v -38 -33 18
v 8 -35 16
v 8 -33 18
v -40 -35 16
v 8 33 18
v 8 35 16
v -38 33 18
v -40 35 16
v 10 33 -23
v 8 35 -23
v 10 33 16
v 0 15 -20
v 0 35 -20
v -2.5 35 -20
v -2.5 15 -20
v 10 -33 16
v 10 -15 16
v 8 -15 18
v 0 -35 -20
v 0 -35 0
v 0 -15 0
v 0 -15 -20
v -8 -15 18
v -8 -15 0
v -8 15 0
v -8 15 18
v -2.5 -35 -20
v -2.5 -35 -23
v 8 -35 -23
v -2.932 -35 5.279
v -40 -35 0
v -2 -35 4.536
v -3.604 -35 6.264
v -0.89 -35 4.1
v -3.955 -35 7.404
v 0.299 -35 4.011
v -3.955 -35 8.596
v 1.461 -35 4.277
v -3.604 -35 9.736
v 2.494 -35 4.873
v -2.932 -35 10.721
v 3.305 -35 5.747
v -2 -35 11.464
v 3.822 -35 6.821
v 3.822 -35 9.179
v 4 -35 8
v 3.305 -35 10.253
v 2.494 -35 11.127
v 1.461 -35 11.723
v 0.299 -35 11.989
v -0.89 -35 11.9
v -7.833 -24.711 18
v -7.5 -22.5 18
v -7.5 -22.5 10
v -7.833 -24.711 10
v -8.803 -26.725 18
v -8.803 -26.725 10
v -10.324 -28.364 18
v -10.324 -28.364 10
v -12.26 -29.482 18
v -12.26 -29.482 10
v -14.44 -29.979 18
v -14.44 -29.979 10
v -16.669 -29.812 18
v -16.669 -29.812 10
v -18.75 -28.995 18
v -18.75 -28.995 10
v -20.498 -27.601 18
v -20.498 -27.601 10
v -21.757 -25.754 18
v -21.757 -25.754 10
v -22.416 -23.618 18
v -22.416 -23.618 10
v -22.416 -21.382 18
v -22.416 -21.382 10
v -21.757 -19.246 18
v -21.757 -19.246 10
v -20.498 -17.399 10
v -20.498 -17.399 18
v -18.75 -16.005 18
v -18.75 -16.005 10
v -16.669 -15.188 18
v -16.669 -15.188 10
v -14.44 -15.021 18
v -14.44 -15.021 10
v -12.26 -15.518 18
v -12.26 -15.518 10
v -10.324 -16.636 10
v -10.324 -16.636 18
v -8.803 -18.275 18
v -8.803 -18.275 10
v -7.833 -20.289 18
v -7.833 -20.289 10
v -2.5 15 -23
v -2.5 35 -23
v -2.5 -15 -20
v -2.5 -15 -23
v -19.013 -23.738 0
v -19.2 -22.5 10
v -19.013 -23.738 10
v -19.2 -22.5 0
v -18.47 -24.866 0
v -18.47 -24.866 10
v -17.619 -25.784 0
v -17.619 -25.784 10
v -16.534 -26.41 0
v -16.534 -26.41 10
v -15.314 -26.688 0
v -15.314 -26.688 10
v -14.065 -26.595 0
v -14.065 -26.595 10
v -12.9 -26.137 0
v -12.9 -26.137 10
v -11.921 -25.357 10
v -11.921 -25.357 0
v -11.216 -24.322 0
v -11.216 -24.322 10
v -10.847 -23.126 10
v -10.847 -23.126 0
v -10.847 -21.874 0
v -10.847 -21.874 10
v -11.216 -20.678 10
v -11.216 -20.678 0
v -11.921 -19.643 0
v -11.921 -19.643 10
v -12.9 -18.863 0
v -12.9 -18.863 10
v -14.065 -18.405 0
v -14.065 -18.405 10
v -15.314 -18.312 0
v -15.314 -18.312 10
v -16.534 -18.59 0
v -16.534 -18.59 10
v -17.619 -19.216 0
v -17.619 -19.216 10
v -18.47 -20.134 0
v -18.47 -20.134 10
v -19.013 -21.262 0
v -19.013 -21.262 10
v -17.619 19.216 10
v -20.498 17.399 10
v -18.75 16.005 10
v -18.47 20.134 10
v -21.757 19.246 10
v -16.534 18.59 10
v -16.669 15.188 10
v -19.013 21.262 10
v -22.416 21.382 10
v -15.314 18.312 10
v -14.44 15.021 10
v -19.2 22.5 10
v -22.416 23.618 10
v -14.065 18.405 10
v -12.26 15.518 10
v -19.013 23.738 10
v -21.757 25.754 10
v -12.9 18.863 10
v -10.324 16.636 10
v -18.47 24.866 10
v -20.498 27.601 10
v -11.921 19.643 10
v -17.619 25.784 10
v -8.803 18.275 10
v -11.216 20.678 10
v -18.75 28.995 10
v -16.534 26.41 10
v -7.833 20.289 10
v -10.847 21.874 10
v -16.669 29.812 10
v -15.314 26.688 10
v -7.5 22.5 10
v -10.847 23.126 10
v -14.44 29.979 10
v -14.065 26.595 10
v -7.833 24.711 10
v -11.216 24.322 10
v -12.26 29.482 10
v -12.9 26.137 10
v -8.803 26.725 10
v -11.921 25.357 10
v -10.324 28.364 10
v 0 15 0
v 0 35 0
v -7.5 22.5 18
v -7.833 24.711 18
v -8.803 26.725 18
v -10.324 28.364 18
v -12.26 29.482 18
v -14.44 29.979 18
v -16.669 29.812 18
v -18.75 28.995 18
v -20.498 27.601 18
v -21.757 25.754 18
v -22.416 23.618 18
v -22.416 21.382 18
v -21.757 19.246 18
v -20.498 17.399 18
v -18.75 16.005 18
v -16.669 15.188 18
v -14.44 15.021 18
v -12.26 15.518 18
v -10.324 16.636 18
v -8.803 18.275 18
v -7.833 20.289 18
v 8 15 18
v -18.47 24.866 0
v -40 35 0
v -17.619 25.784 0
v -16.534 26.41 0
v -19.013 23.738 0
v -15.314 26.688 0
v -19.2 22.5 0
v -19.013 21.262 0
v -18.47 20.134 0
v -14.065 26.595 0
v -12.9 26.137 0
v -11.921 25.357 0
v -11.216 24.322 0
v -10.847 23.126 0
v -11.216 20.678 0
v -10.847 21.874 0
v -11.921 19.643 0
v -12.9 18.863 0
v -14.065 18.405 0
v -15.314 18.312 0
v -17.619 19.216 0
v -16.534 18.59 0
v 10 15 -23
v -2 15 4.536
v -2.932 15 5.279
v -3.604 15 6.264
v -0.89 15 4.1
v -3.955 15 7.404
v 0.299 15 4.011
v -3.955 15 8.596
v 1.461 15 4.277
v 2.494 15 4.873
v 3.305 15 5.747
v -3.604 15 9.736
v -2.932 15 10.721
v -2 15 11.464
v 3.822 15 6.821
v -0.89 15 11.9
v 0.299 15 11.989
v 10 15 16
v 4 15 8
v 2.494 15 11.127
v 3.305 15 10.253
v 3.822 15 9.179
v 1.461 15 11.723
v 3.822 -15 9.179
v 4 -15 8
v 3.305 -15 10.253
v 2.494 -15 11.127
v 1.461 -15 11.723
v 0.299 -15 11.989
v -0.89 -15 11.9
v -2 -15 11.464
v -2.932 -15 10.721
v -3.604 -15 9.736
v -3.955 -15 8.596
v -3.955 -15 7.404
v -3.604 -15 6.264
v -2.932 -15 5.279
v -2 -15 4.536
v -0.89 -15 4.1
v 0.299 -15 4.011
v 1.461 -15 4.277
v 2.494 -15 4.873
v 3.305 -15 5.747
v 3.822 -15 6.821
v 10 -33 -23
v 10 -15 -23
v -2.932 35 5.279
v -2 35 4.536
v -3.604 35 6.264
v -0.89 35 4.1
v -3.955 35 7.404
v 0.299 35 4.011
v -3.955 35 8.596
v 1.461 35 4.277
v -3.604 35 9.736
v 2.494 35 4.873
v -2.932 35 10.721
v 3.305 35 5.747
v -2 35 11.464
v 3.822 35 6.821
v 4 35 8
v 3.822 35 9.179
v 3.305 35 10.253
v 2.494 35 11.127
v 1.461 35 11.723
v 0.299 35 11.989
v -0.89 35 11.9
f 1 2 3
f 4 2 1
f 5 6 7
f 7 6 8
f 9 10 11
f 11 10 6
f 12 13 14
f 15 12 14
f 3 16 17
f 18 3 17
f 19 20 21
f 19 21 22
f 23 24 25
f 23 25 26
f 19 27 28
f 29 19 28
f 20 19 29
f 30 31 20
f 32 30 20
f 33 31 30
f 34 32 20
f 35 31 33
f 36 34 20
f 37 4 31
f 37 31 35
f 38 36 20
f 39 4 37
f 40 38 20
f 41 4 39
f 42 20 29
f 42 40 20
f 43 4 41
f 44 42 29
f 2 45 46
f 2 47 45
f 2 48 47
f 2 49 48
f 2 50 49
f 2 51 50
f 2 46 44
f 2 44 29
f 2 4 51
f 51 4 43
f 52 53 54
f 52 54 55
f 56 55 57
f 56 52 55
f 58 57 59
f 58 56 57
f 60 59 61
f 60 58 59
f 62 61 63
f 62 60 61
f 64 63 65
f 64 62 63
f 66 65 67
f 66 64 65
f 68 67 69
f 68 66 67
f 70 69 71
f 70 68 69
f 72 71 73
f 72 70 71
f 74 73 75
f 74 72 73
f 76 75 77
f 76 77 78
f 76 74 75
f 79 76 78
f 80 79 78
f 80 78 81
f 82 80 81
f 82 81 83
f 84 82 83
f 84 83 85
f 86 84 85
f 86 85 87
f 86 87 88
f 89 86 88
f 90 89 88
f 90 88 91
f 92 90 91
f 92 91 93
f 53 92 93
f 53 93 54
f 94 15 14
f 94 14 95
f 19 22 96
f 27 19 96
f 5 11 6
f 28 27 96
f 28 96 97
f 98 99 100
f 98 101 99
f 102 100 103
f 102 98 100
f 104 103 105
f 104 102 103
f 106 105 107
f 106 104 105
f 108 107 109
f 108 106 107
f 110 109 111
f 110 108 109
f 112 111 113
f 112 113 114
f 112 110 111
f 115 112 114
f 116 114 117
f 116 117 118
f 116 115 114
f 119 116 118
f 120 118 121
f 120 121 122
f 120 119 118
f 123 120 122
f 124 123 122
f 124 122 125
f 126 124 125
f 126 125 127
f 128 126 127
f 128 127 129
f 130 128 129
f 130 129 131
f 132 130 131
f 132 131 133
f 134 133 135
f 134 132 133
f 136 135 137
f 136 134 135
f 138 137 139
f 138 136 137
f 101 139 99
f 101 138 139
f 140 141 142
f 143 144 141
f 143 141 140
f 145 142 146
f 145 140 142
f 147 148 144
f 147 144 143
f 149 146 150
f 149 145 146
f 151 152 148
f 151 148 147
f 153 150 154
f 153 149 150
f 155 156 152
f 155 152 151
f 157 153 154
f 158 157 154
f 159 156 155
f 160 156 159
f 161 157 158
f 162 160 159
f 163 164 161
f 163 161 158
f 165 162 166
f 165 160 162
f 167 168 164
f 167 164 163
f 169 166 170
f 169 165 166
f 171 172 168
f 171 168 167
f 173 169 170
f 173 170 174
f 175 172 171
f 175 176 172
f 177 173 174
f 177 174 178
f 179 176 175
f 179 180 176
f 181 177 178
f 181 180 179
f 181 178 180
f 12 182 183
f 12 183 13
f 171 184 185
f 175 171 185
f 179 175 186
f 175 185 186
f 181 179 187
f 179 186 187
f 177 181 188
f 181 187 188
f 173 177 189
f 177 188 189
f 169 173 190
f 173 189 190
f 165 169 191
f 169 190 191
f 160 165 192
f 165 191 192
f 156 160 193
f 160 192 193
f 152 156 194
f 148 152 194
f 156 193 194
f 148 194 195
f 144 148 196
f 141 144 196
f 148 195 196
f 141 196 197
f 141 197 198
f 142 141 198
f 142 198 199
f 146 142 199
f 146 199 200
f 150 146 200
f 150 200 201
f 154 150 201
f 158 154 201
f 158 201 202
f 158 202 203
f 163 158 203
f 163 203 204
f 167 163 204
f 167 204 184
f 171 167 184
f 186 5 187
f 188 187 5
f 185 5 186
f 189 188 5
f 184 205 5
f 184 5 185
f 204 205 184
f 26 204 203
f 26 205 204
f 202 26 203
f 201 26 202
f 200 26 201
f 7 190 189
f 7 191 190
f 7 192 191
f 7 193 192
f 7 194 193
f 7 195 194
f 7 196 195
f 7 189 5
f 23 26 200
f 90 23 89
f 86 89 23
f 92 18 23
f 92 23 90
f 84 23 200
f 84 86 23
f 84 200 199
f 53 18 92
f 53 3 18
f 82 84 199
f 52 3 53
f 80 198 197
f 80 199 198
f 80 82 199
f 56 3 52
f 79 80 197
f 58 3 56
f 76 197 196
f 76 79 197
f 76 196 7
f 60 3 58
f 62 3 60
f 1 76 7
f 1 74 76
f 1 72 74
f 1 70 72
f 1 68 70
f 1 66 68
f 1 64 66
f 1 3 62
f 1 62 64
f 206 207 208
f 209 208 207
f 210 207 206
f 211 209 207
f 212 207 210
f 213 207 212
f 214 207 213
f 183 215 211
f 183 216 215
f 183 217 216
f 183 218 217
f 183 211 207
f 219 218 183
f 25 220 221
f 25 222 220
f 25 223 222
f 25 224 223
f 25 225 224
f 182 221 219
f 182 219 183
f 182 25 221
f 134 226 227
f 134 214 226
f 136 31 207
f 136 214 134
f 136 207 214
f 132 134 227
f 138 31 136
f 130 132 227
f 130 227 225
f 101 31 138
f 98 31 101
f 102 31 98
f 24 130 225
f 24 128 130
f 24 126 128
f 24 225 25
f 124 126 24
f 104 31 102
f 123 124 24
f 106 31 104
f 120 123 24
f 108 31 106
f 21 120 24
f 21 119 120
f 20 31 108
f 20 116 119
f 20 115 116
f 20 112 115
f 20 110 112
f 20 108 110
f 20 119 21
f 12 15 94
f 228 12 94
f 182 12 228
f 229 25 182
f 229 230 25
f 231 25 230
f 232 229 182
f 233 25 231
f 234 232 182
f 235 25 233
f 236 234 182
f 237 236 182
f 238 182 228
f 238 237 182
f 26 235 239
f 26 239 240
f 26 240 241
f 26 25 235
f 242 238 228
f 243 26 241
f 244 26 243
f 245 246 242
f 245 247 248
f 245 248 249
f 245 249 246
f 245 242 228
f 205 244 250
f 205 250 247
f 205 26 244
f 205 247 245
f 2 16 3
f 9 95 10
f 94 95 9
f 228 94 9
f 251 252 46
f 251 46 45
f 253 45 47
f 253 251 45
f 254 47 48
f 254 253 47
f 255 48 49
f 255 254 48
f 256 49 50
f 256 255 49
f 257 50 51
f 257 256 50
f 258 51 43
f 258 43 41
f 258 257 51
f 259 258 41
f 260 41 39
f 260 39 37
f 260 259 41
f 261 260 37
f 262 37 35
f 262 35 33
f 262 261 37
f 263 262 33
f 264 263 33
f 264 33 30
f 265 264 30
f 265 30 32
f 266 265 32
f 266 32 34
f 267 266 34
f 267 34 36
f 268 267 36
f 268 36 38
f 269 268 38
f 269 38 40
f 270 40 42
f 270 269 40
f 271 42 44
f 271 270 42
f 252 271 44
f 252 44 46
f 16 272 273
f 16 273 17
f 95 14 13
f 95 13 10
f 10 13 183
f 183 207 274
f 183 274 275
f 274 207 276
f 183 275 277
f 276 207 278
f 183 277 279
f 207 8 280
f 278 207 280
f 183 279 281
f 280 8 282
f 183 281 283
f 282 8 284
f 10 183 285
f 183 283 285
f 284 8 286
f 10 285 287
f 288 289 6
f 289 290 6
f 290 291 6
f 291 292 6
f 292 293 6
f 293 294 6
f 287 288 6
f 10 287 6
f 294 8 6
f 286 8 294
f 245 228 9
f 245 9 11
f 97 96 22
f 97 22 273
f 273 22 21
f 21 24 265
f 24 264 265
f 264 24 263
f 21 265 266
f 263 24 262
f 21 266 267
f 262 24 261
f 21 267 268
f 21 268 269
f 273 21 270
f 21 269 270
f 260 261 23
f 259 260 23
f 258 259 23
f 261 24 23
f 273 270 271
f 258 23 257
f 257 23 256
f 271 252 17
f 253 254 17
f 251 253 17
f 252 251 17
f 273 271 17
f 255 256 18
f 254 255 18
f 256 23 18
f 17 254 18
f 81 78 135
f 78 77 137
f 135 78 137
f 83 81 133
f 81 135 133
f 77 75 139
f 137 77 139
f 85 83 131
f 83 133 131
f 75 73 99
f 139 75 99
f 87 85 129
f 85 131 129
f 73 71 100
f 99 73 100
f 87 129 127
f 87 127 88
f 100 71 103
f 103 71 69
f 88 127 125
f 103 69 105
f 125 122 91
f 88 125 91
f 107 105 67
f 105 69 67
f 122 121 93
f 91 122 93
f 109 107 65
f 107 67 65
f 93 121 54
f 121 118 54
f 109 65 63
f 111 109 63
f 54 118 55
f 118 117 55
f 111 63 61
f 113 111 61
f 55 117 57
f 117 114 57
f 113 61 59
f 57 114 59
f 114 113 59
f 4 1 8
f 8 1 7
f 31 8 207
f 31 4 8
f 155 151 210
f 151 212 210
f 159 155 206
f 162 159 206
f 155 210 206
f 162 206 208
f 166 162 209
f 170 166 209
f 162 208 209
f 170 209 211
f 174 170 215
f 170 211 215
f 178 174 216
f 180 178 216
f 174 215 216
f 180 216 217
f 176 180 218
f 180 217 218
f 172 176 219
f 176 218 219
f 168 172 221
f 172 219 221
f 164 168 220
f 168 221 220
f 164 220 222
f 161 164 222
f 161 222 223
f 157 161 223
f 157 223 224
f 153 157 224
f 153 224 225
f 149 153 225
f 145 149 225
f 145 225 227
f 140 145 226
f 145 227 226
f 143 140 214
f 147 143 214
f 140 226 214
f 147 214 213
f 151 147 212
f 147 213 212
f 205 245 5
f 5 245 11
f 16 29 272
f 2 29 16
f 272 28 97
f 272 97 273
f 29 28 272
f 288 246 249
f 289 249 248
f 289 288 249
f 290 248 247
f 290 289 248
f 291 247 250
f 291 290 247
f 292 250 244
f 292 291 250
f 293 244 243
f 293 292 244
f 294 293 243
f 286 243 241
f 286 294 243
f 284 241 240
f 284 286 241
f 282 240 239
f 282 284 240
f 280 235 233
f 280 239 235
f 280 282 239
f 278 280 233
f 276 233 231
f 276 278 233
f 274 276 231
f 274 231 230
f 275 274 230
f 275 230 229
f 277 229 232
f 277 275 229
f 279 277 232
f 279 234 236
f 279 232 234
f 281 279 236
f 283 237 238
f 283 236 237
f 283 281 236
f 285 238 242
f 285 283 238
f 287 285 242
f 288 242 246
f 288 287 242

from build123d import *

# Parameters (mm, degrees)
F0_R           = 4
F1_DEPTH       = 35
F3_SIZE        = 2
F2_W           = 18
F2_H           = 41
F4_DEPTH       = 15
F6_D           = 8.4
F6_CBORE_D     = 15
F6_CBORE_DEPTH = 8


# Not quite as in the source:
# - a pattern or mirror of a feature is missing from the dataset's text; its kind, count and spacing are read off the source's solid


with BuildPart() as f1:
    # F0 (on Front) → F1 (new body, symmetric)
    with BuildSketch(Plane.XZ):
        Polygon((-40, 0), (0, 0), (0, -20), (-2.5, -20), (-2.5, -23), (10, -23), (10, 18), (-40, 18), align=None)
        with Locations((0, 8)):
            Circle(F0_R, mode=Mode.SUBTRACT)
    extrude(amount=F1_DEPTH, both=True)

    # F3
    f3_edges = [f1.edges().sort_by_distance(p)[0] for p in [
        (10, 0, 18),
        (10, -35, -2.5),
        (10, 35, -2.5),
        (-15, 35, 18),
        (-15, -35, 18),
        (-40, 0, 18),
    ]]
    chamfer(f3_edges, length=F3_SIZE)

    # F2 (on Front) → F4 (cut, symmetric)
    with BuildSketch(Plane.XZ):
        with Locations((1, -2.5)):
            Rectangle(F2_W, F2_H)
    extrude(amount=F4_DEPTH, both=True, mode=Mode.SUBTRACT)

    # F6 (through all)
    with Locations(Plane.XY.offset(18)):
        with Locations((-15, 22.5)):
            f6 = CounterBoreHole(F6_D / 2, F6_CBORE_D / 2, F6_CBORE_DEPTH)

    # F6_copies: F6 across plane
    add(f6.mirror(Plane(origin=(0, 0, 0), x_dir=(0, 0, -1), z_dir=(0, -1, 0))), mode=Mode.SUBTRACT)


solid = f1.part
